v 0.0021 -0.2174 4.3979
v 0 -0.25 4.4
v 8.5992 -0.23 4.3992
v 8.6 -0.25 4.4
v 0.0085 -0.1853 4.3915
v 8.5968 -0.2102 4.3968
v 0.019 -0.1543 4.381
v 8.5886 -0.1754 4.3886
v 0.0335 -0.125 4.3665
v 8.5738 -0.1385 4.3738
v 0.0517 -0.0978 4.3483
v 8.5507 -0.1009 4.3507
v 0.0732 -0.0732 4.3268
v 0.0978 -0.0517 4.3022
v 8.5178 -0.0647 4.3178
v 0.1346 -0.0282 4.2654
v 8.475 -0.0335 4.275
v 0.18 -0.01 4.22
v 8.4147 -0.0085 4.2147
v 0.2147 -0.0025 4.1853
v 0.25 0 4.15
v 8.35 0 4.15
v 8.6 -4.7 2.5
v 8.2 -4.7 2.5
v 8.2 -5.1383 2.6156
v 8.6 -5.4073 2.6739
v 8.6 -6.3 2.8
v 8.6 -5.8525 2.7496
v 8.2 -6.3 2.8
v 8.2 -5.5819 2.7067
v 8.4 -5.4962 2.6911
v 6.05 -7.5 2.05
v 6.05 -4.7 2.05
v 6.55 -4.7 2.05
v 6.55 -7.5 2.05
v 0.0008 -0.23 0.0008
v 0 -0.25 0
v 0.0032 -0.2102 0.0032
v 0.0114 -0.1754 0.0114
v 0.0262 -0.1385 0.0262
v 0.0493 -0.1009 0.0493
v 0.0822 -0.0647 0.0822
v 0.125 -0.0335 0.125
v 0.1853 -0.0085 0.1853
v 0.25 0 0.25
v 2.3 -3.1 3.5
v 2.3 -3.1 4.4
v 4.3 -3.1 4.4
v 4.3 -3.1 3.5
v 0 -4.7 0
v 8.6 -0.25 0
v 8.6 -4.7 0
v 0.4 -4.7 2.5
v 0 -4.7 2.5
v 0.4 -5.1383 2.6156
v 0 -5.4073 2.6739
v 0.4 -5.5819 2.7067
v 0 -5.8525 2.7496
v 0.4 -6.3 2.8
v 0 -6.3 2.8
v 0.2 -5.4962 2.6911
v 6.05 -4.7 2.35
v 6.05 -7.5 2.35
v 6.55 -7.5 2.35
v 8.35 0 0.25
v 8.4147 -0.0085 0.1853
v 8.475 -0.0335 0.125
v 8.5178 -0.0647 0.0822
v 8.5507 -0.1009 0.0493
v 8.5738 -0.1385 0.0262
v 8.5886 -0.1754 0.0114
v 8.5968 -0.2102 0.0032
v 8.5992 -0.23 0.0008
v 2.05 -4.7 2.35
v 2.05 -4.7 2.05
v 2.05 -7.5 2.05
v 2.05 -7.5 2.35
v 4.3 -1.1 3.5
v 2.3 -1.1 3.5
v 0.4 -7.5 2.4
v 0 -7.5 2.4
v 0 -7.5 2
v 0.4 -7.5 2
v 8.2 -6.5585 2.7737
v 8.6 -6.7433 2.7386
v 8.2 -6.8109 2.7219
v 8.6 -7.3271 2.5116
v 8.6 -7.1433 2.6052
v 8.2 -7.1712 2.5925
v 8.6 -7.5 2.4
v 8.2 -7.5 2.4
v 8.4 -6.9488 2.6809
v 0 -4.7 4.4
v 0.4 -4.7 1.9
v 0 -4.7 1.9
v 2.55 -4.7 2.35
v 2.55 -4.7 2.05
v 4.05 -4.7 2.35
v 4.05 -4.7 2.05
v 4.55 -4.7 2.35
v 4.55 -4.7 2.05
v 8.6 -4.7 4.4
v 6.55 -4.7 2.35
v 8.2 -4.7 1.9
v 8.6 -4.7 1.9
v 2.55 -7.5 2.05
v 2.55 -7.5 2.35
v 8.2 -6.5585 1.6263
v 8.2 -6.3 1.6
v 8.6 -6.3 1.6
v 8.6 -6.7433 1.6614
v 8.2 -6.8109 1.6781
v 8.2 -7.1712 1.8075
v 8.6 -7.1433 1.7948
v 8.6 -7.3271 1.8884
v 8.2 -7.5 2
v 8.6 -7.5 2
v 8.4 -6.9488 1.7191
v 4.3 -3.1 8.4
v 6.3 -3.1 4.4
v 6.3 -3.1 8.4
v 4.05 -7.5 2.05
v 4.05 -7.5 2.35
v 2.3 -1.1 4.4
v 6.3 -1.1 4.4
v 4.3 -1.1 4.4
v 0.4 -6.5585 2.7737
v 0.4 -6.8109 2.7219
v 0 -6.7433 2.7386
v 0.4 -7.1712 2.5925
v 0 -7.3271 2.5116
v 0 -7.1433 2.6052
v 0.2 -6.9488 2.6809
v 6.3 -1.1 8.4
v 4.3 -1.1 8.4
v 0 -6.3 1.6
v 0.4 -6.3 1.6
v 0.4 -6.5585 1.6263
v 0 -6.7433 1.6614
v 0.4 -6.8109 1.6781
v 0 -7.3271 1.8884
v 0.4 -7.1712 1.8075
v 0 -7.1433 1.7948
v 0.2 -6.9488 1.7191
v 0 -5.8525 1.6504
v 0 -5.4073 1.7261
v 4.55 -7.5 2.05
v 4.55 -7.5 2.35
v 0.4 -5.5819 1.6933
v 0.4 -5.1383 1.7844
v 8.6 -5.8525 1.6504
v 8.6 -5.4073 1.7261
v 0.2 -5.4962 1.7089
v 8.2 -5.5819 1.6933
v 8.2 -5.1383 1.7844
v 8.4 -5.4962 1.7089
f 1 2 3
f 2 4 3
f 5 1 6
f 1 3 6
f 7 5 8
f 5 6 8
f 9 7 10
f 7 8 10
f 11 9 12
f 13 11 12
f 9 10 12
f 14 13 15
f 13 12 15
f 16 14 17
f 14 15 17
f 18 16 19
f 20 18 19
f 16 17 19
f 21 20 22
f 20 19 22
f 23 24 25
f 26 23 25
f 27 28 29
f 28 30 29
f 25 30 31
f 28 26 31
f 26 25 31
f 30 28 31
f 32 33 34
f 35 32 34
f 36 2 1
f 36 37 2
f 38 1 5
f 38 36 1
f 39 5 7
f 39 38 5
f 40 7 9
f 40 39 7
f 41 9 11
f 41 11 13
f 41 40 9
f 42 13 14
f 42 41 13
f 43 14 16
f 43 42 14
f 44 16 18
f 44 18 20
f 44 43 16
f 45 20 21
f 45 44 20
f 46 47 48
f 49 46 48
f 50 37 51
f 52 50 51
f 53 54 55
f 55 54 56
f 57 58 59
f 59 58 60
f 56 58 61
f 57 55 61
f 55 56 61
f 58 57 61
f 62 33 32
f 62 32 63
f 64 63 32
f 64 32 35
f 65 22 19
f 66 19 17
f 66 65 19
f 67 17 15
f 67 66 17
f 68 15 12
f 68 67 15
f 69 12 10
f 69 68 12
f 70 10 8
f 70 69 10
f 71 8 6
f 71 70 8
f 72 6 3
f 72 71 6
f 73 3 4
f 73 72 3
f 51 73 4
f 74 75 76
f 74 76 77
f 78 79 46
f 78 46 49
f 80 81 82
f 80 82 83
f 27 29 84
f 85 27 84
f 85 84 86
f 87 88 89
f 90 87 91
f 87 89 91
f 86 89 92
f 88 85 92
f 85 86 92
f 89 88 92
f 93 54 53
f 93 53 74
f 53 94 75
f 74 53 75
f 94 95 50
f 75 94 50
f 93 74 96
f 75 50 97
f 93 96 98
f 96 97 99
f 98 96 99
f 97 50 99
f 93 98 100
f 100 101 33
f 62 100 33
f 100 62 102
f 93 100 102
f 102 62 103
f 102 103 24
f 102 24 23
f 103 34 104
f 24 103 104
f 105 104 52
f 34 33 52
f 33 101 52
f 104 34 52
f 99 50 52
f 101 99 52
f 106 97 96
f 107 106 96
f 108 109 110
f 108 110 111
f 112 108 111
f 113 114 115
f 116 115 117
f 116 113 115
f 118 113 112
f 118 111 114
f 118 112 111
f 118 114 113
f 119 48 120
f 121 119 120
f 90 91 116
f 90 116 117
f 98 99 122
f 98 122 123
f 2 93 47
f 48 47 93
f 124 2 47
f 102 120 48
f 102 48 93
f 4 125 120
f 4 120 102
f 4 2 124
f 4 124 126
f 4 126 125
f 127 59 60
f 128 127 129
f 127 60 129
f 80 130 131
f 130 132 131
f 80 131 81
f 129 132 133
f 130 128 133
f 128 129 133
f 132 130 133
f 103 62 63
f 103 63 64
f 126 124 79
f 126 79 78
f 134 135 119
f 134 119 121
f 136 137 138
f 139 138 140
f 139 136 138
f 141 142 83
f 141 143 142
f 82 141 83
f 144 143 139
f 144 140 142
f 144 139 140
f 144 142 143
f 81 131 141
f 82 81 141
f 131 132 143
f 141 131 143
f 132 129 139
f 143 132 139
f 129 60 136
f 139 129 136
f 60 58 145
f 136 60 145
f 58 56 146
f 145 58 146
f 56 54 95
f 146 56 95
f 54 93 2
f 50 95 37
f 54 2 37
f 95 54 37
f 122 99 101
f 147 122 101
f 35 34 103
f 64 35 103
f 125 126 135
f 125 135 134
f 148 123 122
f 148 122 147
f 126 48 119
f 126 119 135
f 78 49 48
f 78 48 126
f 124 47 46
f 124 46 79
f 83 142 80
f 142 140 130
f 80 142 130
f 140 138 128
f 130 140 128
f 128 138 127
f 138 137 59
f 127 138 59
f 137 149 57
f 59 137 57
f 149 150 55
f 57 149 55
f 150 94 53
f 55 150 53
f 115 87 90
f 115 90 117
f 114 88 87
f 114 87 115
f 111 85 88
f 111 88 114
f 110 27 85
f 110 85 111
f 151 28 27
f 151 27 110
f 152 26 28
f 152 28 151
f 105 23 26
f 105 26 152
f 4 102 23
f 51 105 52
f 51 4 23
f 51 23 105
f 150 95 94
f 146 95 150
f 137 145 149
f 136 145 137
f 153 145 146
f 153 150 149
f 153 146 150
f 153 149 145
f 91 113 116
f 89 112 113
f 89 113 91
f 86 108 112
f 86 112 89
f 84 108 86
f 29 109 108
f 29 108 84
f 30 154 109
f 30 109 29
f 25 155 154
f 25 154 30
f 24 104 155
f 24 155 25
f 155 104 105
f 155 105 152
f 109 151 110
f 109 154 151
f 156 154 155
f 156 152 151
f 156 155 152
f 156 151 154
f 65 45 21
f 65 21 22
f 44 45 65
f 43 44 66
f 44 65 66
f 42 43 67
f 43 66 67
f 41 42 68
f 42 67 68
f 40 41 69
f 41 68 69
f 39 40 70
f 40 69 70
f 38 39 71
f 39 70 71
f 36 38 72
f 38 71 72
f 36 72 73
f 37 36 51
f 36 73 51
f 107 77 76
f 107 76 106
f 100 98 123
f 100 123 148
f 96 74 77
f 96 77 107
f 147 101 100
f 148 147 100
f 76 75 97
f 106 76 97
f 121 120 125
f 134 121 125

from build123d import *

# Parameters (mm, degrees)
SKETCH1_W           = 8.6
SKETCH1_H           = 4.4
BOSS_EXTRUDE1_DEPTH = 4.7
SKETCH4_W           = 4
SKETCH4_H           = 2
CUT_EXTRUDE1_DEPTH  = 0.9
SKETCH5_W           = 2
SKETCH5_H           = 2
BOSS_EXTRUDE3_DEPTH = 4.9
SKETCH7_W           = 0.4
SKETCH7_H           = 1.2
BOSS_EXTRUDE4_DEPTH = 2.8
CUT_EXTRUDE3_DEPTH  = 8.6
SKETCH9_W           = 0.5
SKETCH9_H           = 0.3
BOSS_EXTRUDE5_DEPTH = 2.8
FILLET1_R           = 0.25


with BuildPart() as part:
    # Sketch1 → Boss-Extrude1 (new body)
    with BuildSketch(Plane(origin=(0, 0, 0), x_dir=(1, 0, 0), z_dir=(0, 1, 0))):
        with Locations((4.3, -2.2)):
            Rectangle(SKETCH1_W, SKETCH1_H)
    extrude(amount=-BOSS_EXTRUDE1_DEPTH)

    # Sketch4 → Cut-Extrude1 (cut)
    with BuildSketch(Plane.XY.offset(4.4)):
        with Locations((4.3, -2.1)):
            Rectangle(SKETCH4_W, SKETCH4_H)
    extrude(amount=-CUT_EXTRUDE1_DEPTH, mode=Mode.SUBTRACT)

    # Sketch5 → Boss-Extrude3 (add)
    with BuildSketch(Plane.XY.offset(3.5)):
        with Locations((5.3, -2.1)):
            Rectangle(SKETCH5_W, SKETCH5_H)
    extrude(amount=BOSS_EXTRUDE3_DEPTH)

    # Sketch7 → Boss-Extrude4 (add)
    with BuildSketch(Plane.XZ.offset(4.7)):
        with Locations((0.2, 2.2)):
            Rectangle(SKETCH7_W, SKETCH7_H)
        with Locations((8.4, 2.2)):
            Rectangle(SKETCH7_W, SKETCH7_H)
    extrude(amount=BOSS_EXTRUDE4_DEPTH)

    # Sketch8 → Cut-Extrude3 (cut)
    with BuildSketch(Plane.ZY):
        with BuildLine():
            Line((1.9, -4.7), (1.6, -4.7))
            Line((1.6, -4.7), (1.6, -6.3))
            add(Edge.make_bspline(
                [(1.9, -4.7), (1.667864555, -5.492366311), (1.6, -6.3)],
                knots=[0, 0, 0, 0.547569636, 0.547569636, 0.547569636], degree=2))
        make_face()
        with BuildLine():
            add(Edge.make_bspline(
                [(2.5, -4.7), (2.732135445, -5.492366311), (2.8, -6.3)],
                knots=[0, 0, 0, 0.547569636, 0.547569636, 0.547569636], degree=2))
            Line((2.8, -6.3), (2.8, -4.7))
            Line((2.8, -4.7), (2.5, -4.7))
        make_face()
        with BuildLine():
            add(Edge.make_bspline(
                [(2.8, -6.3), (2.761794113, -6.997512334), (2.40000004, -7.5)],
                knots=[0, 0, 0, 0.682369162, 0.682369162, 0.682369162], degree=2))
            Line((2.40000004, -7.5), (2.8, -7.5))
            Line((2.8, -7.5), (2.8, -6.3))
        make_face()
        with BuildLine():
            add(Edge.make_bspline(
                [(1.6, -6.3), (1.638205887, -6.997512334), (1.99999996, -7.5)],
                knots=[0, 0, 0, 0.682369162, 0.682369162, 0.682369162], degree=2))
            Line((1.6, -6.3), (1.6, -7.5))
            Line((1.6, -7.5), (1.99999996, -7.5))
        make_face()
    extrude(amount=-CUT_EXTRUDE3_DEPTH, mode=Mode.SUBTRACT)

    # Sketch9 → Boss-Extrude5 (add)
    with BuildSketch(Plane.XZ.offset(4.7)):
        with Locations((4.3, 2.2)):
            Rectangle(SKETCH9_W, SKETCH9_H)
        with Locations((2.3, 2.2)):
            Rectangle(SKETCH9_W, SKETCH9_H)
        with Locations((6.3, 2.2)):
            Rectangle(SKETCH9_W, SKETCH9_H)
    extrude(amount=BOSS_EXTRUDE5_DEPTH)

    # Fillet1
    fillet1_edges = [part.edges().sort_by_distance(p)[0] for p in [
        (4.3, 0, 0),
        (8.6, 0, 2.2),
        (4.3, 0, 4.4),
        (0, 0, 2.2),
    ]]
    fillet(fillet1_edges, radius=FILLET1_R)


solid = part.part
